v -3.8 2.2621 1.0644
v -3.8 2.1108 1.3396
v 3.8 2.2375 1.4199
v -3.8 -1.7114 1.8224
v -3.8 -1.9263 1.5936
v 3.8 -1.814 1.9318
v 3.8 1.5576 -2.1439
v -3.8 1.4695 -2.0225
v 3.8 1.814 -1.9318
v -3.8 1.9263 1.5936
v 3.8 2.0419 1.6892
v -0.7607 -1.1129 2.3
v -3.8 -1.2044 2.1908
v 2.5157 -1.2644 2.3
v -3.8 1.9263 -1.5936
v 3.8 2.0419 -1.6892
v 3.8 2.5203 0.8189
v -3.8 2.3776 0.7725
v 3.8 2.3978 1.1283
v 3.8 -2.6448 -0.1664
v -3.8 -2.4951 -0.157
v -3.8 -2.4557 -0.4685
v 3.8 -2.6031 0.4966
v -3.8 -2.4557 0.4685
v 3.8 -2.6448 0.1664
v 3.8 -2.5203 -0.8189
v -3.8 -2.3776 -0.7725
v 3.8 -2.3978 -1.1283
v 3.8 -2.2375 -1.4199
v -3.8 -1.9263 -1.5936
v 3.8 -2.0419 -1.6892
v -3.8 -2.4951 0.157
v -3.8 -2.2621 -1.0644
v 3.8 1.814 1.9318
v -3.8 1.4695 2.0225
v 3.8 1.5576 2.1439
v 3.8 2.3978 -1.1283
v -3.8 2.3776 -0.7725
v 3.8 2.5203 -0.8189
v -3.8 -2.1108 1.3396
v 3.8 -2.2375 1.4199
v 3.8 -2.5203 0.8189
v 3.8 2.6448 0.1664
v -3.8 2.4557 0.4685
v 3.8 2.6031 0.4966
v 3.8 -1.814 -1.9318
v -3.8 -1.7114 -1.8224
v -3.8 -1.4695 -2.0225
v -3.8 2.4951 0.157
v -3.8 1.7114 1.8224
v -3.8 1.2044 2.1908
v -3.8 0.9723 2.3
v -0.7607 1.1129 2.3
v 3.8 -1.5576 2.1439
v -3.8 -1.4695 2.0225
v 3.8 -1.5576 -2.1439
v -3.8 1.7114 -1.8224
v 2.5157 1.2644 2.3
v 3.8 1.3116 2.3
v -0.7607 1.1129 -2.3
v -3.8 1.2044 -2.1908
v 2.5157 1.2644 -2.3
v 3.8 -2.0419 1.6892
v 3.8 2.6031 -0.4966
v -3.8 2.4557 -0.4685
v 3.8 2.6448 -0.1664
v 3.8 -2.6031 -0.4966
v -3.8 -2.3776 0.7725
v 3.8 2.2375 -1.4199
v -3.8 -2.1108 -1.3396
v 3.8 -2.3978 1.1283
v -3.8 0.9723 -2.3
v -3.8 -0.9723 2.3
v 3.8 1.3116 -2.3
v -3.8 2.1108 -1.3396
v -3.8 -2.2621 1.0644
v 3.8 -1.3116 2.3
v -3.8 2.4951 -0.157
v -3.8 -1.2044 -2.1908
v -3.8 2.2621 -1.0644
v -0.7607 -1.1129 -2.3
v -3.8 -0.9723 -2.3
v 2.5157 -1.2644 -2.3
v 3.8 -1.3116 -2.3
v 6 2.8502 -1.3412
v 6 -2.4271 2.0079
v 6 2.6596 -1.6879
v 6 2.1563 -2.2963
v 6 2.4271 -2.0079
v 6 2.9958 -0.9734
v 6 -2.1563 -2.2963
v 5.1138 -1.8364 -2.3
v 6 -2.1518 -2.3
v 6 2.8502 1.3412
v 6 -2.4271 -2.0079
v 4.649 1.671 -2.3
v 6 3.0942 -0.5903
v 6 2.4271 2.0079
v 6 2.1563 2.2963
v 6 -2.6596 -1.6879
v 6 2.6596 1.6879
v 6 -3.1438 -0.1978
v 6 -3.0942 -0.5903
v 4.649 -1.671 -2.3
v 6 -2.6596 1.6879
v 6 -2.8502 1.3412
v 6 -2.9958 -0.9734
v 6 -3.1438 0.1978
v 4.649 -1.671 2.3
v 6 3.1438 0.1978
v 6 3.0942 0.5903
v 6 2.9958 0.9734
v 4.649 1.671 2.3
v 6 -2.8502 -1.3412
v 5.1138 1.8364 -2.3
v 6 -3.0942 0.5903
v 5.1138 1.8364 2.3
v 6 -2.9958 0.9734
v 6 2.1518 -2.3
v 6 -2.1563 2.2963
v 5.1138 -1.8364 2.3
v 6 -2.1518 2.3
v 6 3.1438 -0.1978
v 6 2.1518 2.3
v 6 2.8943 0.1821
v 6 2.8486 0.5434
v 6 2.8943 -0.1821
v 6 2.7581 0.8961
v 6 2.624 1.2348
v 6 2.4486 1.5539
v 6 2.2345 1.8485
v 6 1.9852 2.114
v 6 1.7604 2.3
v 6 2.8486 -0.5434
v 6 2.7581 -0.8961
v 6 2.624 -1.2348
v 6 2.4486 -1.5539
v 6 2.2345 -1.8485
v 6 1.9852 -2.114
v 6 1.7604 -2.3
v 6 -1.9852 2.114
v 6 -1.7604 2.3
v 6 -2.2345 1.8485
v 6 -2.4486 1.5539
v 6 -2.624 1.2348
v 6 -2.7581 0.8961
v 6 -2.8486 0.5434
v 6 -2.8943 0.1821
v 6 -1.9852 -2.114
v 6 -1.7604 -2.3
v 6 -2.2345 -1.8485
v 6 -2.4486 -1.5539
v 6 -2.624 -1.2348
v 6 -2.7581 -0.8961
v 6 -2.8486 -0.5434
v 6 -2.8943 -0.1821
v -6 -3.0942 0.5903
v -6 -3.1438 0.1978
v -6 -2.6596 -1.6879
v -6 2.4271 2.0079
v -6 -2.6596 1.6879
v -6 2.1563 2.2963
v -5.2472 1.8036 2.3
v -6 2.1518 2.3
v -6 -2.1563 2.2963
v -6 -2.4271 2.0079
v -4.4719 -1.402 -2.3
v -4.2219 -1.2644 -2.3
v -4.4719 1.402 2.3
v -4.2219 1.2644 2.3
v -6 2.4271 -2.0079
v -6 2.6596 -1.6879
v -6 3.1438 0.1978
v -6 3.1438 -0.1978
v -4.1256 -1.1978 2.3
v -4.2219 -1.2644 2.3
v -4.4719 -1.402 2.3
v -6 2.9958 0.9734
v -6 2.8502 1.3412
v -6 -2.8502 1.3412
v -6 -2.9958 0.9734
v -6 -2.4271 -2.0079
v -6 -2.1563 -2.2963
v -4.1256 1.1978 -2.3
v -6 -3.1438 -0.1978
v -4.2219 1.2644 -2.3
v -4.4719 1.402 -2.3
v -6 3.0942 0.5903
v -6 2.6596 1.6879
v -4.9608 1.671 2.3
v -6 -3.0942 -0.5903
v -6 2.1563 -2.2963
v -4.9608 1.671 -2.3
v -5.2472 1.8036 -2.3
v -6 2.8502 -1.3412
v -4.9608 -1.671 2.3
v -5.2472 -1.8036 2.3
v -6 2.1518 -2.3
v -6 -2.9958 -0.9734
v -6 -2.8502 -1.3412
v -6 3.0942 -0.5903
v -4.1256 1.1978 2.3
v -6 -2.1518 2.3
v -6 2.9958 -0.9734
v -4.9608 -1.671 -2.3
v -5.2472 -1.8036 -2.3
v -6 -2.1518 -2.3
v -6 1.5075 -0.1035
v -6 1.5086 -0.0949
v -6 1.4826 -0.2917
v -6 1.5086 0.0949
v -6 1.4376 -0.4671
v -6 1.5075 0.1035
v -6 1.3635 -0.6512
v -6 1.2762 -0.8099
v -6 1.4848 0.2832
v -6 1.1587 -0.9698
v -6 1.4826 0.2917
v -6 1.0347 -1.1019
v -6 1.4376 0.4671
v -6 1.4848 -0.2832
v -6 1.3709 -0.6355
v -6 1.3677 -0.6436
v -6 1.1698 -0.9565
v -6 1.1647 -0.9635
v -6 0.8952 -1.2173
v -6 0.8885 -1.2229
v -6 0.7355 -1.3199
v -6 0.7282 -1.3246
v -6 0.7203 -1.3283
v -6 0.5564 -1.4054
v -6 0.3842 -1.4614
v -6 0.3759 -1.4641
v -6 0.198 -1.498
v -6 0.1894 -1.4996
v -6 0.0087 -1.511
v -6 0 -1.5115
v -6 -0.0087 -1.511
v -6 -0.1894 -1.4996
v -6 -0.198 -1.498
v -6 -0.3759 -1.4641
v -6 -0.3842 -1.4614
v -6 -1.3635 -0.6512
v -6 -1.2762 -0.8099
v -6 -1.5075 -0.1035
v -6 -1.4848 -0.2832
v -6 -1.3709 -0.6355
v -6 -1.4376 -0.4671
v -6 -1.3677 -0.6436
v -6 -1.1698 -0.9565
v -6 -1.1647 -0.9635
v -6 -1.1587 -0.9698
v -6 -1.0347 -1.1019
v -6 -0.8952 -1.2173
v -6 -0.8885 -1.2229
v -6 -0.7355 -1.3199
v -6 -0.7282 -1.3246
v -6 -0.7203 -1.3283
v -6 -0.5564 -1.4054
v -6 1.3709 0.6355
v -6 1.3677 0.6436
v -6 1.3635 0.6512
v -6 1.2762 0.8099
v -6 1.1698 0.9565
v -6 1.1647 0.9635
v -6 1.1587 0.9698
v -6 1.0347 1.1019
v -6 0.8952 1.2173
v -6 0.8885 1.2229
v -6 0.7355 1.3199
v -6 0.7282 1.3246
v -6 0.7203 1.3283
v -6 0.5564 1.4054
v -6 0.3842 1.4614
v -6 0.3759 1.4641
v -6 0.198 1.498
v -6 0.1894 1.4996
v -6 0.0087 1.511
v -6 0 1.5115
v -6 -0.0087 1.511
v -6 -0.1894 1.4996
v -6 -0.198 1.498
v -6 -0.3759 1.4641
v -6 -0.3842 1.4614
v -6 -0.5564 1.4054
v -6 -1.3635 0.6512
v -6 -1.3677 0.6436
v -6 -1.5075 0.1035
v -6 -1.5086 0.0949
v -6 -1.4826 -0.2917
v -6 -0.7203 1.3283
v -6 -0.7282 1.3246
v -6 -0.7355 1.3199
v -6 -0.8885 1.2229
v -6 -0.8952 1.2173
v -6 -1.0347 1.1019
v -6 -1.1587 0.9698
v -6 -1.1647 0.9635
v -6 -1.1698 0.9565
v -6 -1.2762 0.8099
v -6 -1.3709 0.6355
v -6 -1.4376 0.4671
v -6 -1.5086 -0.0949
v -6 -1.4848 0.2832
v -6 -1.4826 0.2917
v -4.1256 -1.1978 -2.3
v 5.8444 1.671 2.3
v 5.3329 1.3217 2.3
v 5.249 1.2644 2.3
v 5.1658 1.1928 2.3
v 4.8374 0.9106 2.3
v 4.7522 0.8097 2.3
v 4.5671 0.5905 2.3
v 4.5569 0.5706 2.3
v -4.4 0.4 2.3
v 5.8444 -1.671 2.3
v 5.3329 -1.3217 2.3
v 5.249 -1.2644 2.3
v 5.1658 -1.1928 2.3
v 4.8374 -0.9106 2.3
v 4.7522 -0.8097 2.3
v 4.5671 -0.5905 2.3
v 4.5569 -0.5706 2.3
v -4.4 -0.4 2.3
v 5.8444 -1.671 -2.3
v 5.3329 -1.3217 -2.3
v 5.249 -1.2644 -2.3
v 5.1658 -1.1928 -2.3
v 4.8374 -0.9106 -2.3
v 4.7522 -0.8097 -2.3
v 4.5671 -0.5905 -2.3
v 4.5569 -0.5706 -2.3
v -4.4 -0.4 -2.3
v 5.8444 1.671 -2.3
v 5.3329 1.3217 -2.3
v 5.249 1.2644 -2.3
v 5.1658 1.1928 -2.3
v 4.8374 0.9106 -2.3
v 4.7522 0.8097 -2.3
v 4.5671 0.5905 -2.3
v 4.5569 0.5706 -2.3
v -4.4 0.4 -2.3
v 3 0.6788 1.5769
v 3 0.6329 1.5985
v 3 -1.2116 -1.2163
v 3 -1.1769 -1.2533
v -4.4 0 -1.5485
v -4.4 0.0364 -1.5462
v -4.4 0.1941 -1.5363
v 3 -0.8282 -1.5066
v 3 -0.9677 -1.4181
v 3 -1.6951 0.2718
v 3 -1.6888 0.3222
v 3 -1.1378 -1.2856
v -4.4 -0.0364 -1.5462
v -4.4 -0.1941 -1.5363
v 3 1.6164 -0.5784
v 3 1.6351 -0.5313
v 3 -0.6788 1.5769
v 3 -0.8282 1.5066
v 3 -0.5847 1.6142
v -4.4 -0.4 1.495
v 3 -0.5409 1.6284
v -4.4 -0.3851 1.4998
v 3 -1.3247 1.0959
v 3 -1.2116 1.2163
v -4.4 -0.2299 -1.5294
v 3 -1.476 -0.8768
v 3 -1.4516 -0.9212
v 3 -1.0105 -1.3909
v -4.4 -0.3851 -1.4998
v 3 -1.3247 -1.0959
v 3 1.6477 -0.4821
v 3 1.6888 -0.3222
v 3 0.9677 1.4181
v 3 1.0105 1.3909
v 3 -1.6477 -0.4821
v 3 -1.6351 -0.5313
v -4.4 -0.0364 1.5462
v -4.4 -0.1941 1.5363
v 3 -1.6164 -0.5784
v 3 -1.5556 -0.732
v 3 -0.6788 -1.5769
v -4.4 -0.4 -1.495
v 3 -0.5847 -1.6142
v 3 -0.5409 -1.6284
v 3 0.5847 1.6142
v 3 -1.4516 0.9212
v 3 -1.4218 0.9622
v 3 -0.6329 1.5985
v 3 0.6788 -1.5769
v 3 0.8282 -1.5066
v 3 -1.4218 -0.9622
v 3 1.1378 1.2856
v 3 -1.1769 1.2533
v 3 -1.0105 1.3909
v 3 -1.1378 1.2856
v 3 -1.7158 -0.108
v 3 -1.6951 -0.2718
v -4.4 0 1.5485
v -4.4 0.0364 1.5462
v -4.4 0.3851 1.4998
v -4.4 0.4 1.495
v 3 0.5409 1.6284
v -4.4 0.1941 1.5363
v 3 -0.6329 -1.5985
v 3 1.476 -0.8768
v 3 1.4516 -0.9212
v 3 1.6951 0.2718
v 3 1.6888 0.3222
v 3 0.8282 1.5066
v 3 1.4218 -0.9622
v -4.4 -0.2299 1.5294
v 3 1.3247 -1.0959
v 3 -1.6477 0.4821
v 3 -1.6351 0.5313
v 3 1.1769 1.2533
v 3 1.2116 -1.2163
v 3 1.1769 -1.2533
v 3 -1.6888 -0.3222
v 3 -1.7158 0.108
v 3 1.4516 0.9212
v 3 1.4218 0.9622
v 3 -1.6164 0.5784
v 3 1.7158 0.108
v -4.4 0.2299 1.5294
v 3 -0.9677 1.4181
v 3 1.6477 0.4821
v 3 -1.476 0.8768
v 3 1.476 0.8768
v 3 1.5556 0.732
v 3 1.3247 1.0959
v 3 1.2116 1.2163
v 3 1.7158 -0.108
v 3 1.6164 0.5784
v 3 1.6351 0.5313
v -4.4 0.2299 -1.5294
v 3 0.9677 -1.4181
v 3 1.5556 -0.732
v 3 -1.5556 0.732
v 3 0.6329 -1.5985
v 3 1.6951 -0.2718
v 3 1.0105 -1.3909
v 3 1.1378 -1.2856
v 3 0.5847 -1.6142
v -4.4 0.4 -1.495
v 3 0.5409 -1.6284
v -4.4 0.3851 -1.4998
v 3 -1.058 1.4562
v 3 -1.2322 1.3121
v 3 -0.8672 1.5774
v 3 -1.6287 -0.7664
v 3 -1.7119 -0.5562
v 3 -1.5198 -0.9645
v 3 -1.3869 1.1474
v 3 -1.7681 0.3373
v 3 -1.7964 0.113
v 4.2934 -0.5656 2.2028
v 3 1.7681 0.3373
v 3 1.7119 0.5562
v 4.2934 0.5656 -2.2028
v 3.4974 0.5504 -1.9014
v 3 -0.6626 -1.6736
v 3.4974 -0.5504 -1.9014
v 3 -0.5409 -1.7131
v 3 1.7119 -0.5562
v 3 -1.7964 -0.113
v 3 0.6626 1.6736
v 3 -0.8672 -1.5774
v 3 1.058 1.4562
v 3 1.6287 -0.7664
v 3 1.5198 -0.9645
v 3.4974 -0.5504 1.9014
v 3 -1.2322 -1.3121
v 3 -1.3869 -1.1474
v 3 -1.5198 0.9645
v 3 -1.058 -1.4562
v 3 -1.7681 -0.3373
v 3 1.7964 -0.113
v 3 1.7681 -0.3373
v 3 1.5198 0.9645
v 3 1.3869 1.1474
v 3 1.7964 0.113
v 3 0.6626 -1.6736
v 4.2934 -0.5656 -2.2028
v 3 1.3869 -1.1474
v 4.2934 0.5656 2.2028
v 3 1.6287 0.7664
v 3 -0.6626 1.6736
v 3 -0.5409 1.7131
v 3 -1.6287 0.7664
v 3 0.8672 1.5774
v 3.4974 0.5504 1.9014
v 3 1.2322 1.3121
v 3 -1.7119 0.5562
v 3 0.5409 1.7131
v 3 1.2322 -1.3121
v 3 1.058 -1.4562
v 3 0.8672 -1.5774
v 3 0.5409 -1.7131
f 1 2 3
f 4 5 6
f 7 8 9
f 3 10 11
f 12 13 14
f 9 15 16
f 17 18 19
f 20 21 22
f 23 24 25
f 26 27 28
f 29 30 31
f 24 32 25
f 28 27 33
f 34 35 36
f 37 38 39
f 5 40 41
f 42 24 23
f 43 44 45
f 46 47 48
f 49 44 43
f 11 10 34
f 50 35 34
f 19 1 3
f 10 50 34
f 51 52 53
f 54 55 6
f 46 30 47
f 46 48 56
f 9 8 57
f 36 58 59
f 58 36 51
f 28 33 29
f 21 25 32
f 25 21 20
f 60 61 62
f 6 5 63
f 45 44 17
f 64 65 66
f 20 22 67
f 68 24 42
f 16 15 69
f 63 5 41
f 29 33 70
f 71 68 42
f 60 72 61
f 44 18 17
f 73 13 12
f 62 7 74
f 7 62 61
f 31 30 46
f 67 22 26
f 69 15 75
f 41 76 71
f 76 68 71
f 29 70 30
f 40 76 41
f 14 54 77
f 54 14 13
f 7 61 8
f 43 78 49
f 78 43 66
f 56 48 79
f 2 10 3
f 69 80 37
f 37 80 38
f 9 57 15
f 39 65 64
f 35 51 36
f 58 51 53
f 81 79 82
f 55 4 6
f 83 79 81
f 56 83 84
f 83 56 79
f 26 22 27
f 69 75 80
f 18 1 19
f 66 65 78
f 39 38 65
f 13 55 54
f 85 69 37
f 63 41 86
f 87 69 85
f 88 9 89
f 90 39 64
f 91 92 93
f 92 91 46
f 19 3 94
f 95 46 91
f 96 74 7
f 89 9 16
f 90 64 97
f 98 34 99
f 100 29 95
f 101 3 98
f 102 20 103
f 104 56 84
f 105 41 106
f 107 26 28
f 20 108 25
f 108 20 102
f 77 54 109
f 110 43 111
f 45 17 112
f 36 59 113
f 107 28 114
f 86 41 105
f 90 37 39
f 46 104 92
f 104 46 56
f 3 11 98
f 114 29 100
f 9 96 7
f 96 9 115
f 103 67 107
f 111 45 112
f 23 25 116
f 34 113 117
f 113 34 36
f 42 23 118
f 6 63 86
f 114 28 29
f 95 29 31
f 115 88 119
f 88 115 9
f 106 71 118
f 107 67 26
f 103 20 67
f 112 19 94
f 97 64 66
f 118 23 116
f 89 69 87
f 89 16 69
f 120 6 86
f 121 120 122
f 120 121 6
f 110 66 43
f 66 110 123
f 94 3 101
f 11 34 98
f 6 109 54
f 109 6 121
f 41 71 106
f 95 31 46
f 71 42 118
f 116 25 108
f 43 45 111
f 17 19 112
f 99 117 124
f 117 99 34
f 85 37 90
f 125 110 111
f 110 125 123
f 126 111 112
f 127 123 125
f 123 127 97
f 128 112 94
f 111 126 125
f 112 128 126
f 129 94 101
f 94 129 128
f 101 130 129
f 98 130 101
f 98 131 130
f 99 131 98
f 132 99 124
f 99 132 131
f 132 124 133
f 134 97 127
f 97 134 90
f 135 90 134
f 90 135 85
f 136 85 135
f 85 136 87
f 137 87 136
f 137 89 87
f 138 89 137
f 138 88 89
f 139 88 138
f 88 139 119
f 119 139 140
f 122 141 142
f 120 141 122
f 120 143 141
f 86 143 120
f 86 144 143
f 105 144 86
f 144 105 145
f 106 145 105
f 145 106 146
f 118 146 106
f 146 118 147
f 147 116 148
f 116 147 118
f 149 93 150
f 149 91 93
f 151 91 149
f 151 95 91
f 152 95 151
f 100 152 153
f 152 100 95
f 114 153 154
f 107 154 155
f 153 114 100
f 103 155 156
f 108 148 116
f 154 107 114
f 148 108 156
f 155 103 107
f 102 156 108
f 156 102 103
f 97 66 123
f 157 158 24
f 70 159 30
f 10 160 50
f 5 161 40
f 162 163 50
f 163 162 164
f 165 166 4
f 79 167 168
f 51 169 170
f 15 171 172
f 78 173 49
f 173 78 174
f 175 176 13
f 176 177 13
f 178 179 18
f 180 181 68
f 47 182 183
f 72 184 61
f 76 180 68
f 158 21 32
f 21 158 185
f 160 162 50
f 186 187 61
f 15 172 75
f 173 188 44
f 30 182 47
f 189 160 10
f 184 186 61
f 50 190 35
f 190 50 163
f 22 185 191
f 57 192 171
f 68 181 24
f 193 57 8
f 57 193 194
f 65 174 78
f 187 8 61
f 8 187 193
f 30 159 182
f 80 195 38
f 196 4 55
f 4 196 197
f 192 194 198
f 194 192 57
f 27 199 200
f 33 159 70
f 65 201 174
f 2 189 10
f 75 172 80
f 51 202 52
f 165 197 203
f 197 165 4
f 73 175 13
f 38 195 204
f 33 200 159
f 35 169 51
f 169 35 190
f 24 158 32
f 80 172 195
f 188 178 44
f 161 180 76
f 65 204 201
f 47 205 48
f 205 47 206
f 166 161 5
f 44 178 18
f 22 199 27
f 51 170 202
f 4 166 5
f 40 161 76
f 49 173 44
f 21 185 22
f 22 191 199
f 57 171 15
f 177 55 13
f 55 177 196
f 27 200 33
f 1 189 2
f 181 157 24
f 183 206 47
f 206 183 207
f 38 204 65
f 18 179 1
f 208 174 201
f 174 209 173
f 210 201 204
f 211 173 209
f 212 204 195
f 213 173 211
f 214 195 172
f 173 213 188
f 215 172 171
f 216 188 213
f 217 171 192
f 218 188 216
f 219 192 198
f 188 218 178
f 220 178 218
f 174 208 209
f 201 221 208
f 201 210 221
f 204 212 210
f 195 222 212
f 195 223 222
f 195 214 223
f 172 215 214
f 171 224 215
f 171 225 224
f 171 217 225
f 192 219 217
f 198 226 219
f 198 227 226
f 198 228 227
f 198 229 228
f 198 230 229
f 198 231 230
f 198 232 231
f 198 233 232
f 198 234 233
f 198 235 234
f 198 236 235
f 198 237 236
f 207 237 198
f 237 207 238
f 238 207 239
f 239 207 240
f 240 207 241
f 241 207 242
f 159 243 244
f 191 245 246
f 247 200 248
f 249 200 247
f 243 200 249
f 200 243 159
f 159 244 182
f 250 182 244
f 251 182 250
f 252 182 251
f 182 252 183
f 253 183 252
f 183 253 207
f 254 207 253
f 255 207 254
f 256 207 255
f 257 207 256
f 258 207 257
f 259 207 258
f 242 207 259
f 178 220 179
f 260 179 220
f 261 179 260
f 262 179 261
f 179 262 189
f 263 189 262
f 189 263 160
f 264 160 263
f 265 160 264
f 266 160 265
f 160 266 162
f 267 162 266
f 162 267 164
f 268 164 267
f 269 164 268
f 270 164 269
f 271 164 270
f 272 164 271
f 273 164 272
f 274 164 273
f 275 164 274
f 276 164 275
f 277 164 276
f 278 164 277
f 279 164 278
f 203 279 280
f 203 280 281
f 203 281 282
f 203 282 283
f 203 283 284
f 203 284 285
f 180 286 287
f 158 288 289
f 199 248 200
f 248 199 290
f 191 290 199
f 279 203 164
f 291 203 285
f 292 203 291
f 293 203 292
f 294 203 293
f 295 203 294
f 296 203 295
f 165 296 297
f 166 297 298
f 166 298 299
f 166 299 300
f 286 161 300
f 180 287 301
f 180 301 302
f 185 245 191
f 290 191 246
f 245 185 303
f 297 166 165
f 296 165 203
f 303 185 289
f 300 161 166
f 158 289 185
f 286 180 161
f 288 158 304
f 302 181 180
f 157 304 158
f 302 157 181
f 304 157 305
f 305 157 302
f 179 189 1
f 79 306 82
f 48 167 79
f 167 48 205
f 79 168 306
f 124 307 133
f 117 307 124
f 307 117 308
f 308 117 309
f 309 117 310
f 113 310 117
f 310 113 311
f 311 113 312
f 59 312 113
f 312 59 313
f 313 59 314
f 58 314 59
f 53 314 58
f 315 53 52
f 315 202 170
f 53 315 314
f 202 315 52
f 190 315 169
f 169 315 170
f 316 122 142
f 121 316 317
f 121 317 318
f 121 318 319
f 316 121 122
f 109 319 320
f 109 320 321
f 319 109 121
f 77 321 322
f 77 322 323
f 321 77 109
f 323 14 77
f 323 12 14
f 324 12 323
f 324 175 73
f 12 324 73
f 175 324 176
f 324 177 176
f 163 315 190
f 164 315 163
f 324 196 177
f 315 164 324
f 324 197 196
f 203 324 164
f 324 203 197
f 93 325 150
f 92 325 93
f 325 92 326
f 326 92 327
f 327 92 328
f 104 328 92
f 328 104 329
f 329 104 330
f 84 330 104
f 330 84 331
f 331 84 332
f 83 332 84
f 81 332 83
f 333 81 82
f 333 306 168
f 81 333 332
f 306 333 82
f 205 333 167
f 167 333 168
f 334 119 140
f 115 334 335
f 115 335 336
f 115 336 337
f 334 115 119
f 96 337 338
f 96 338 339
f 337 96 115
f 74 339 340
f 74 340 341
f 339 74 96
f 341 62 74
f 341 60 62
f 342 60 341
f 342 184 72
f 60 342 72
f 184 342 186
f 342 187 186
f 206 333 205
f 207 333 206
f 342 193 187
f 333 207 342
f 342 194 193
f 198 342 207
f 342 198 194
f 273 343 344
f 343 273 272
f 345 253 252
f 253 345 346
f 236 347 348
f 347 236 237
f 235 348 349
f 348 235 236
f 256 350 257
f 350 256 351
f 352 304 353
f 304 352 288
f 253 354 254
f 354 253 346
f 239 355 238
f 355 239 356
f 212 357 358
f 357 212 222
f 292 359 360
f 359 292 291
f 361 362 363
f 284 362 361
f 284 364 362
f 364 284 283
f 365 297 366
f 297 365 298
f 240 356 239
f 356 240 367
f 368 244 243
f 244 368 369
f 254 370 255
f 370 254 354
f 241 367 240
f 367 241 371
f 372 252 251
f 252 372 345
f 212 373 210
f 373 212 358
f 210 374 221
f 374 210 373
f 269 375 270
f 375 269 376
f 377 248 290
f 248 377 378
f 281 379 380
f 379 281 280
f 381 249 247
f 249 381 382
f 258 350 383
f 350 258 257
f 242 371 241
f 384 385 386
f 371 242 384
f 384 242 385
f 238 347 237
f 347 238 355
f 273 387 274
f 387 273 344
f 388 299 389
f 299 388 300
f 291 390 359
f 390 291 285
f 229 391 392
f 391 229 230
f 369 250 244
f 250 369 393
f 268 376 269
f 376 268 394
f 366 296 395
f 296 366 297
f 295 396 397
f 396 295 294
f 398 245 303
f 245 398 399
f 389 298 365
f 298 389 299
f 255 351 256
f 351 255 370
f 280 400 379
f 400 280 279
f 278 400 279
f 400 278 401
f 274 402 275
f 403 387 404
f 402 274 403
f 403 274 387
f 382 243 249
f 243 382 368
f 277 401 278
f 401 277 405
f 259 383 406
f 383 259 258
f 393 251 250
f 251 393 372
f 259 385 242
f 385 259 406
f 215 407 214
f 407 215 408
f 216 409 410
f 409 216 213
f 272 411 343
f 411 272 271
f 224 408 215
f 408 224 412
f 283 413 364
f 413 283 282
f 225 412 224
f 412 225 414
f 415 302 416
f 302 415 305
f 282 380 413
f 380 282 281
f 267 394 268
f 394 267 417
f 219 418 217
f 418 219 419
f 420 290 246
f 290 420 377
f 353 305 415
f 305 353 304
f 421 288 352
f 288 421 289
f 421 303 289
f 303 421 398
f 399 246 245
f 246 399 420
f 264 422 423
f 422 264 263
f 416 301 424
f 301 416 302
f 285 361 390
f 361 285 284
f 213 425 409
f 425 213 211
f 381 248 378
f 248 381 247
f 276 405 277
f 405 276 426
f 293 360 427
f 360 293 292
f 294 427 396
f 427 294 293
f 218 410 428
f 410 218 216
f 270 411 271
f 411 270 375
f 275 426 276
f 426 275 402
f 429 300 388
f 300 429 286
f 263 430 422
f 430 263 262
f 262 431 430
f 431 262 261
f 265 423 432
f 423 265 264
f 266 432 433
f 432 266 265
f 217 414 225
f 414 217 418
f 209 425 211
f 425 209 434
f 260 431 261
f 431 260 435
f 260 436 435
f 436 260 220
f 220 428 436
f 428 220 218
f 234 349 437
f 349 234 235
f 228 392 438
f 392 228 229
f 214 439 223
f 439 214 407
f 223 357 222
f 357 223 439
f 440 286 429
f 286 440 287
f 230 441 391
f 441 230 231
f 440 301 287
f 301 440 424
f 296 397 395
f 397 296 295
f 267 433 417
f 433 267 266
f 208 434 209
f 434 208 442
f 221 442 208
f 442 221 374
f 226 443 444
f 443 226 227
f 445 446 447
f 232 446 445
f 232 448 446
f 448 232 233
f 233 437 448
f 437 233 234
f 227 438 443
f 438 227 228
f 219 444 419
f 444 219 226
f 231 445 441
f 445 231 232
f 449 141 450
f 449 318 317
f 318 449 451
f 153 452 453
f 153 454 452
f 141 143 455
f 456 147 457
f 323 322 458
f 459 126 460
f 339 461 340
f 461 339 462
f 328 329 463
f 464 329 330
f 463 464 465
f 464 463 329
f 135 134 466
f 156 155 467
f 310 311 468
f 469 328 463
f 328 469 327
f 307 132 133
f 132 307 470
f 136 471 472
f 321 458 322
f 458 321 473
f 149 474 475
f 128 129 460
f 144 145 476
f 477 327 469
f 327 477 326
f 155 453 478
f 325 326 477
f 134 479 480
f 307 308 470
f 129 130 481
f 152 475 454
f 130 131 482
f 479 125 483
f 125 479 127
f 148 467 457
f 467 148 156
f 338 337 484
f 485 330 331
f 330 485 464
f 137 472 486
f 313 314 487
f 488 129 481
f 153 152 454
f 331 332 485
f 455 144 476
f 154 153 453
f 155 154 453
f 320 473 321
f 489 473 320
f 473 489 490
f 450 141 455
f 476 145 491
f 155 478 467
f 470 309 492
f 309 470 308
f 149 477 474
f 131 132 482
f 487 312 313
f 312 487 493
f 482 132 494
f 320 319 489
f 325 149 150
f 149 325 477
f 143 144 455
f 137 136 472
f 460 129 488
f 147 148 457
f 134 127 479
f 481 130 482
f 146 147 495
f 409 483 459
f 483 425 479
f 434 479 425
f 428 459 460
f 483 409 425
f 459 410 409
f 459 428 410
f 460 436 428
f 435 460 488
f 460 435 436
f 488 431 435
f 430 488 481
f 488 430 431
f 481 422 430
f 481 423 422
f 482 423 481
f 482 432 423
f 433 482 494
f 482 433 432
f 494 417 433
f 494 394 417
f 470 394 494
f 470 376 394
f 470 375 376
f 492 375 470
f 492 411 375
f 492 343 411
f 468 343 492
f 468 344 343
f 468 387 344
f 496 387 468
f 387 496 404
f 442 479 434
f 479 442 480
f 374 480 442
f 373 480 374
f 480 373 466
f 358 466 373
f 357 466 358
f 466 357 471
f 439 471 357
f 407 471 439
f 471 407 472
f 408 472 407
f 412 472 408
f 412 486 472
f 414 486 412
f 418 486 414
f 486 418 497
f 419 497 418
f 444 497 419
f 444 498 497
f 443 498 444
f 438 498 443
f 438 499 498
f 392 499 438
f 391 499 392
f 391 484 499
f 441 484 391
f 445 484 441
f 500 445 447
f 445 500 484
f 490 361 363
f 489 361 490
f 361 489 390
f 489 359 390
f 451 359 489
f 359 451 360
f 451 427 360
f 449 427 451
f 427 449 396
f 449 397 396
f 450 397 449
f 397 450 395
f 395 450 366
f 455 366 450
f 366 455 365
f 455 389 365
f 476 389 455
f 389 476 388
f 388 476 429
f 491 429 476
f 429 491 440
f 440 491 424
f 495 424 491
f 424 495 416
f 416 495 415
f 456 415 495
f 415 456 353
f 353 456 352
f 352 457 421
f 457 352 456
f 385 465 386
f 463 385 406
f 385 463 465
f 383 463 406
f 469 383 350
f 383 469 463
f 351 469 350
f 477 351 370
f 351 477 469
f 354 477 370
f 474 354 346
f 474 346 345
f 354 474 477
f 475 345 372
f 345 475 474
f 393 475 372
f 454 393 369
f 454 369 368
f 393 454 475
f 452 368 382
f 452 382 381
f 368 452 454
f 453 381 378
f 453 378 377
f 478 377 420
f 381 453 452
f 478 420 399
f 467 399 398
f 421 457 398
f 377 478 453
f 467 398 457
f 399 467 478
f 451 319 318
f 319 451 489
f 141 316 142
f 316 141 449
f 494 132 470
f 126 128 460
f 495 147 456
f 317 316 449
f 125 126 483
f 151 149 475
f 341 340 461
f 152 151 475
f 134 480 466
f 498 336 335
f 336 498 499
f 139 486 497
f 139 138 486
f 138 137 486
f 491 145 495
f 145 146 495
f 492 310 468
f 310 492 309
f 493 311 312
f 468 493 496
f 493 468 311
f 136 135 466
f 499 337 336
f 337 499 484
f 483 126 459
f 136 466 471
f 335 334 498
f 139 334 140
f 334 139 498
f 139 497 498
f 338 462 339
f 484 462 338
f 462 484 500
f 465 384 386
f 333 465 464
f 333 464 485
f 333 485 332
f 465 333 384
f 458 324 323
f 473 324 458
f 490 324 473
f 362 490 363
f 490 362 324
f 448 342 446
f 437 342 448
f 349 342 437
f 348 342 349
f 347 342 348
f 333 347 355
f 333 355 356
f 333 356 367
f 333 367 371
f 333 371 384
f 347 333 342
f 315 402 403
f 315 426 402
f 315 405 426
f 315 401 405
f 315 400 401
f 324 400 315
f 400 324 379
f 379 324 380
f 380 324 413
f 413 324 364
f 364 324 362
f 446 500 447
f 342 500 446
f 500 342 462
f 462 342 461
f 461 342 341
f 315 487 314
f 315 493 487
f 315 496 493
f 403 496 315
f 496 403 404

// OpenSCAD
length = 3;
M4 = true;
locker = false;
h_base = 1.5; // 0.6 for clip2a


module clip(
    M4 = false,
    locker = false,

    h_total = length,
    h_cone_bas = 2.2,
    h_cone_haut = 2.2,
    h_base = 1.5,
    larg_top = locker ? 3.2 : 1.2,  
    larg_bot = locker ? 2 : 0.8,    
    largeur = locker ? 3.2 : 4.6,   
    d_centre_bas = 5,
    d_centre_haut = 5.3,
    d_ext_bas = 6.3,
    d_ext_haut = locker ? 6.5 : 6.3, 
    
    d_vis_bas = 3,
    d_vis_haut = 3.6,
    d_fraisee = 5.8,
    profondeur_fraisee = 3,
    
    resolution = 50,    
) {

    h_centre = h_total - h_cone_bas - h_cone_haut;
    h_trap = h_total - h_base;

    module cylindre_complet() {
        union() {
            translate([-h_total/2 + h_cone_bas, 0, 0])
                rotate([0, 90, 0])
                    cylinder(h=h_centre, d1=d_centre_bas, d2=d_centre_haut, $fn=resolution);

            translate([h_total/2 - h_cone_haut, 0, 0])
                rotate([0, 90, 0])
                    cylinder(h=h_cone_haut, d1=d_centre_haut, d2=d_ext_haut, $fn=resolution);

            translate([-h_total/2, 0, 0])
                rotate([0, 90, 0])
                    cylinder(h=h_cone_bas, d1=d_ext_bas, d2=d_centre_bas, $fn=resolution);
            /*translate([0, 0, 0])
                rotate([0, 90, 0])
                    cylinder(h=3, d1=3, d2=6, center=true, $fn=resolution);            */
        }
    }

    module fente_trapeze() {
        linear_extrude(height=max(d_ext_bas, d_ext_haut) + 0.2, center=true)
            polygon(points=[
                [ h_trap, -larg_top/2],
                [ h_trap,  larg_top/2],
                [    0,    larg_bot/2],
                [    0,   -larg_bot/2]
            ]);
    }

    module trou_vis() {
        rotate([0, 90, 0])
            cylinder(h=h_total + 1, d1=d_vis_bas, d2=d_vis_haut, center=true, $fn=resolution);
    }

    module chanfrein_fraisee() {
        translate([h_total/2 - profondeur_fraisee/2, 0, 0])
            rotate([0, 90, 0])
                cylinder(h=profondeur_fraisee, d1=d_vis_haut, d2=d_fraisee, center=true, $fn=resolution);
    }
    
    module addCenter() {

    }   

    difference() {
        intersection() {
            cylindre_complet();            
            translate([-h_total/2, -max(d_ext_bas, d_ext_haut)/2, -largeur/2]) {
                cube([h_total, max(d_ext_bas, d_ext_haut), largeur]);
            }
                
        }

        translate([-h_total/2 + h_base + 0.1, 0, 0])
            fente_trapeze();

        if (M4) {
            union() {
                trou_vis();
                chanfrein_fraisee();
                
            }
        }
    }
}

// Exemple d’appel avec trou de vis conique M4
//clip(h_total = length*4); // clip3a avec h_total=3
//clip(h_total = length*4, h_base= 0.6); // clip2a
//clip(h_total = length*4, M4 = true); // clip2M4 With M4
//clip(h_total = length*4, larg_top = 3.2, larg_bot = 2, d_ext_haut= 6.5, largeur = 3.2); // clip3
clip(h_total = length*4, M4 = M4, locker = locker, h_base = h_base);
